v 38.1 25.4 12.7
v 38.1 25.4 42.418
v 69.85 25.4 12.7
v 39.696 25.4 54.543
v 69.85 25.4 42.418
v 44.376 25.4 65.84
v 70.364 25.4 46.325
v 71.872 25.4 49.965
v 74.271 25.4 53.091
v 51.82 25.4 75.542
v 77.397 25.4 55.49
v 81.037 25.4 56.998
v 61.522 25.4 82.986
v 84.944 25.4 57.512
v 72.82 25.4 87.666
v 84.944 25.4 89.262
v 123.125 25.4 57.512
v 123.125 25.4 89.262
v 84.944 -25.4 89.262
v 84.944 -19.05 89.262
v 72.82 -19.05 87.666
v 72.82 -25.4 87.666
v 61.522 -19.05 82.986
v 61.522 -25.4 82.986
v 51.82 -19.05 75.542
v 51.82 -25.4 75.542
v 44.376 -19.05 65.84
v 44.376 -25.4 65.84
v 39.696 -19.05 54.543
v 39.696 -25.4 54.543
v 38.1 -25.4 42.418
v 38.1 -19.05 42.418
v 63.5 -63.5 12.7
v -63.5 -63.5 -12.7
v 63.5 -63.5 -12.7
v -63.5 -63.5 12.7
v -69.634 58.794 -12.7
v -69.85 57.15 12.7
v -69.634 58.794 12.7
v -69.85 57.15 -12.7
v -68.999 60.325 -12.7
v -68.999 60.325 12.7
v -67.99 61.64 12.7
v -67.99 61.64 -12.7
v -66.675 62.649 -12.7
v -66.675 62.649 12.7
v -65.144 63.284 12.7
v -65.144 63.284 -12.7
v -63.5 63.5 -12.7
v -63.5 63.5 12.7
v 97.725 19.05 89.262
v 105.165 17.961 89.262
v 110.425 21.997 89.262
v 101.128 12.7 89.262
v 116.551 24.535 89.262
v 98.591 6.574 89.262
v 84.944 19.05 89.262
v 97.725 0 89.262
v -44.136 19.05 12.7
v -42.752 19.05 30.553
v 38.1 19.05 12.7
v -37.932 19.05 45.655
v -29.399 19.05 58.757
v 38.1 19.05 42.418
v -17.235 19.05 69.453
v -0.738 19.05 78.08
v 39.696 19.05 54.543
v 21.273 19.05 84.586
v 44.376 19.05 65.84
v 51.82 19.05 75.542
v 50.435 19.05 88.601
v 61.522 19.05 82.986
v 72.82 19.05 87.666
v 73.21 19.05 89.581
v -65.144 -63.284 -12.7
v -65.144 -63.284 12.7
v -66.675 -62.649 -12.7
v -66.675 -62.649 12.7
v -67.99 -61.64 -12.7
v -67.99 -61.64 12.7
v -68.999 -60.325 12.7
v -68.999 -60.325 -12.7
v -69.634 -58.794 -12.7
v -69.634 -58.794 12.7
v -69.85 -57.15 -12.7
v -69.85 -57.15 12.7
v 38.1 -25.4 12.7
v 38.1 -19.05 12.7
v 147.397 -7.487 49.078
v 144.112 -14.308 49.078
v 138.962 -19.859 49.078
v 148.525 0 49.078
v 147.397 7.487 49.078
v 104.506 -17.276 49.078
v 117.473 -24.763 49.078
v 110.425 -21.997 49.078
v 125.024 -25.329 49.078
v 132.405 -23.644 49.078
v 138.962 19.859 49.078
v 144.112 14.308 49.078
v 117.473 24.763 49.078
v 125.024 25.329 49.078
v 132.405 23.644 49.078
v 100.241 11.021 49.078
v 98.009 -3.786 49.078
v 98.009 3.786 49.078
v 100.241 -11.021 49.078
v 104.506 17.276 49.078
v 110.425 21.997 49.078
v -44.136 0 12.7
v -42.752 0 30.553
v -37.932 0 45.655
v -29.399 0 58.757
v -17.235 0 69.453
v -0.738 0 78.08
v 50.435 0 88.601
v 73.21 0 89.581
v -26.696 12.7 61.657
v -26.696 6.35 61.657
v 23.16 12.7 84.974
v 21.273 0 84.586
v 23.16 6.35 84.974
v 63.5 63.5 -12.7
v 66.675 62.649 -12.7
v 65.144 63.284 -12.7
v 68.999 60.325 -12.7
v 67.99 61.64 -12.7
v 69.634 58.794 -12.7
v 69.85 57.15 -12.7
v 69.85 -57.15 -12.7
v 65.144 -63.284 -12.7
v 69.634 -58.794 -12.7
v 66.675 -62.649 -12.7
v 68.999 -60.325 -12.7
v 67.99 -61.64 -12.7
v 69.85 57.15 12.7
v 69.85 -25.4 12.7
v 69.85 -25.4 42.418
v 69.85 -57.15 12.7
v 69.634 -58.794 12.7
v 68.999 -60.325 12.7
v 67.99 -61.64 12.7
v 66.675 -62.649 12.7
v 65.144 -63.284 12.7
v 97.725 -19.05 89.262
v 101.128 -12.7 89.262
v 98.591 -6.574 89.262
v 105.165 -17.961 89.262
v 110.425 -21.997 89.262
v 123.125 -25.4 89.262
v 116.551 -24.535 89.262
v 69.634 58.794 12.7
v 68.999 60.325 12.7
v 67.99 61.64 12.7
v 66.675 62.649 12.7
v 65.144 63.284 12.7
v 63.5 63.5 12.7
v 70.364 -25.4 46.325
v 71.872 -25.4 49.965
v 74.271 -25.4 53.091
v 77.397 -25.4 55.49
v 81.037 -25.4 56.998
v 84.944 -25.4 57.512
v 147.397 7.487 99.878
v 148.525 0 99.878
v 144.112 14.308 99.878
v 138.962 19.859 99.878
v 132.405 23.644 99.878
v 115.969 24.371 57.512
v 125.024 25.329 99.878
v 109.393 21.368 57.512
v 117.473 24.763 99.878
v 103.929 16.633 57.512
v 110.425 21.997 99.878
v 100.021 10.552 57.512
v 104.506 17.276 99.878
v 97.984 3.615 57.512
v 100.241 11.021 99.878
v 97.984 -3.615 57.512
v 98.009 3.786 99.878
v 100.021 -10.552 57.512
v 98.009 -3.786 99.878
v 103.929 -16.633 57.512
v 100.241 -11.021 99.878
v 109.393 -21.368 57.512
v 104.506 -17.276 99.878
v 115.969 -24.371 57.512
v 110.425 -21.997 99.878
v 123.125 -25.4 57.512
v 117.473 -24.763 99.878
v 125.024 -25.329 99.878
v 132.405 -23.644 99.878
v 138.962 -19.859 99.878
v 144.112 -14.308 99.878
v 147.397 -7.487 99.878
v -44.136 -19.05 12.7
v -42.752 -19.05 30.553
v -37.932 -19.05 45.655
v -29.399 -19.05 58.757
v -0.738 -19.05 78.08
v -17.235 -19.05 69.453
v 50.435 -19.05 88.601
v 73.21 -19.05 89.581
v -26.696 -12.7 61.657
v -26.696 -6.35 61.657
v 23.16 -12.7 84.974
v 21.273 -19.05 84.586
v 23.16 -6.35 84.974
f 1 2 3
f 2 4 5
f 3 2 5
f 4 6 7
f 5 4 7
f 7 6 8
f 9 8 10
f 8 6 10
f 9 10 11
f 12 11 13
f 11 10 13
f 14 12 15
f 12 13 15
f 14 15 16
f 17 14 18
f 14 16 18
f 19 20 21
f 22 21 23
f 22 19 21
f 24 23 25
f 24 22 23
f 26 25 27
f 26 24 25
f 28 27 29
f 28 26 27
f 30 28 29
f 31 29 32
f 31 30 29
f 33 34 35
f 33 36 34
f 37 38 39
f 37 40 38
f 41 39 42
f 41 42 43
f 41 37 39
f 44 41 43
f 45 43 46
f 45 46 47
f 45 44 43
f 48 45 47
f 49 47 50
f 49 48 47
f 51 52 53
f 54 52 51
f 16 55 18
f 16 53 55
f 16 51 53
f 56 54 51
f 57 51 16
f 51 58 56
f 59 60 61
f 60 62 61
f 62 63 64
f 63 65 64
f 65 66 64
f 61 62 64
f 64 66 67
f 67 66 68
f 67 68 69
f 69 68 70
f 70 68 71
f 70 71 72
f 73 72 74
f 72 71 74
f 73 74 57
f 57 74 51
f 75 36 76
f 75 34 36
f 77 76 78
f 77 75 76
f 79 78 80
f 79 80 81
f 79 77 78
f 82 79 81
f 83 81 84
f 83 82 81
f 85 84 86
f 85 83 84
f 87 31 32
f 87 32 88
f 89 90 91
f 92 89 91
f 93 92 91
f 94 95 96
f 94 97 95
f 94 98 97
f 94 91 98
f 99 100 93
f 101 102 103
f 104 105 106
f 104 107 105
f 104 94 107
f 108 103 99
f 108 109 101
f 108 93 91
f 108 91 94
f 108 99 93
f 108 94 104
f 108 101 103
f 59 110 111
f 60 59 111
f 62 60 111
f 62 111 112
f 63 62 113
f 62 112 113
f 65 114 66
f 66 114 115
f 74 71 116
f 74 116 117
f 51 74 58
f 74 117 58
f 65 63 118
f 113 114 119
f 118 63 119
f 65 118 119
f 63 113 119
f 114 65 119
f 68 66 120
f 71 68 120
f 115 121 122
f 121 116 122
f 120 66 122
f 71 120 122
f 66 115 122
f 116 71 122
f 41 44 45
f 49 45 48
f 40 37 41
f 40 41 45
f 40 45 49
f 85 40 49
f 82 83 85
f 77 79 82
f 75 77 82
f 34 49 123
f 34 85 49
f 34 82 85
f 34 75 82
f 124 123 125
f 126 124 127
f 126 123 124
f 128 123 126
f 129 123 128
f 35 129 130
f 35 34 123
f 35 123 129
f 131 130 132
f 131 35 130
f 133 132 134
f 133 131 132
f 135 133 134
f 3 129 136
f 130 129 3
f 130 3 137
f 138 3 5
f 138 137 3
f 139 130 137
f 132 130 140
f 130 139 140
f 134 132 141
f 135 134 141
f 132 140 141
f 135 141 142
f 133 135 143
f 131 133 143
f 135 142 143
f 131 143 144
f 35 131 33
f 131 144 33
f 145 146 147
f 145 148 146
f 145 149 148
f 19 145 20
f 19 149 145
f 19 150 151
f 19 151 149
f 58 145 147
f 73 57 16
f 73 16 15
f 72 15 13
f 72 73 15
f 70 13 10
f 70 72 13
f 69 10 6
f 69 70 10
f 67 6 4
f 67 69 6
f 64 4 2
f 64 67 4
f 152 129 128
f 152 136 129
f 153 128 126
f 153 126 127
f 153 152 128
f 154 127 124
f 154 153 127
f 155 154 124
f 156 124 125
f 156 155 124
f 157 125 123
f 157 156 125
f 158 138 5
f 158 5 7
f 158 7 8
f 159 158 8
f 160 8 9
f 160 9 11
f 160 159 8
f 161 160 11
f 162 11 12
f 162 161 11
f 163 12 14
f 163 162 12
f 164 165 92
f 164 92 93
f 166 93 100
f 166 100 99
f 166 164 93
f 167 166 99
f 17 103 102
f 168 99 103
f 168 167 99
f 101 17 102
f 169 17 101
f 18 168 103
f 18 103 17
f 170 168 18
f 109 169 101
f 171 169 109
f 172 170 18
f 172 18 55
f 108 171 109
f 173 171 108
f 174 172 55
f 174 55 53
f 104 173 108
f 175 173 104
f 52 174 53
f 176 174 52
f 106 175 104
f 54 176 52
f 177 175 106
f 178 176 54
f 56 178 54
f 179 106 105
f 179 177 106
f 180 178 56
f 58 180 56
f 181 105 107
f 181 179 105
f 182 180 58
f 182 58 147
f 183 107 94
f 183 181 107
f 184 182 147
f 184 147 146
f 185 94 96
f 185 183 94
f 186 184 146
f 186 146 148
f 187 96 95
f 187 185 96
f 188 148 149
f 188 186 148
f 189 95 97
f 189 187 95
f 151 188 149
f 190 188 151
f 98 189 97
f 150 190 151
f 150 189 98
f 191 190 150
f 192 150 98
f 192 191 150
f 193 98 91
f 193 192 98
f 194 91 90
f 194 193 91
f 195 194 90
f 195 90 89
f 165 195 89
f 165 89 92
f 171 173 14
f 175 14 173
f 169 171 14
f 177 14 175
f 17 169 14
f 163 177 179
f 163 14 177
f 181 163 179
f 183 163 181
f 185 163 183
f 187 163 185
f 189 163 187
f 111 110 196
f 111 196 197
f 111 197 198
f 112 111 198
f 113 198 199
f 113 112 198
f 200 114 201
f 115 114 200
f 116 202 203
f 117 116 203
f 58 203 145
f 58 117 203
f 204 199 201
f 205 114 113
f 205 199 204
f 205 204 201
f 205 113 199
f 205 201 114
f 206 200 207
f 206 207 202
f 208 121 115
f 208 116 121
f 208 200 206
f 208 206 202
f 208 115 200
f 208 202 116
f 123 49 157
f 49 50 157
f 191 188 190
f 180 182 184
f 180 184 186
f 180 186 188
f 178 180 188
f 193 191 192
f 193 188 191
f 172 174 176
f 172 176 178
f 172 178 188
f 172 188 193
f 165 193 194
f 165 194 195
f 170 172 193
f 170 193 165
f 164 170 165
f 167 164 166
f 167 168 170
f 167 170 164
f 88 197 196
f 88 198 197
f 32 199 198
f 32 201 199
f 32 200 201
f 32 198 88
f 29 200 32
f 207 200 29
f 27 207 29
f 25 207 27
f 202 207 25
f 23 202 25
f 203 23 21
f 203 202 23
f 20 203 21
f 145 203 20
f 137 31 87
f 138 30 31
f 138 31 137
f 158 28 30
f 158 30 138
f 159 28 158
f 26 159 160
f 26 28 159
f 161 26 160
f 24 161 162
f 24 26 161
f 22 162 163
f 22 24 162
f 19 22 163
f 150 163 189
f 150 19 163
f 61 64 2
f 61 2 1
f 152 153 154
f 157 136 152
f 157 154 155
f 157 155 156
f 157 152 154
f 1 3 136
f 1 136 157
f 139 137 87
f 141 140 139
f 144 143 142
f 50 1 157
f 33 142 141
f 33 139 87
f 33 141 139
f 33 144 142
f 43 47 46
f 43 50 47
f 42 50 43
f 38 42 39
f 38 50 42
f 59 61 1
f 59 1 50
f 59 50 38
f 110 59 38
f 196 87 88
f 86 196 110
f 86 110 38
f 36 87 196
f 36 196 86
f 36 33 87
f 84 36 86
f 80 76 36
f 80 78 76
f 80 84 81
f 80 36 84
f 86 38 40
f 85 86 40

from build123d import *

# Parameters (mm, degrees)
F1_DEPTH = 63.5
F0_W     = 25.4
F0_H     = 31.75
F2_DEPTH = 25.4
F3_DEPTH = 19.05
F5_R     = 6.35


with BuildPart() as f1:
    # F0 (on Front) → F1 (new body, symmetric)
    with BuildSketch(Plane.XZ):
        Polygon((-69.85, -12.7), (69.85, -12.7), (69.85, 12.7), (38.1, 12.7), (-44.13639, 12.7), (-69.85, 12.7), align=None)
    extrude(amount=F1_DEPTH, both=True)

    # F0 (on Front) → F2 (join, symmetric)
    with BuildSketch(Plane.XZ):
        with BuildLine():
            Line((38.1, 12.7), (69.85, 12.7))
            Line((69.85, 12.7), (69.85, 42.418495))
            ThreePointArc((69.85, 42.418495), (74.270896, 53.091481), (84.943882, 57.512377))
            Line((84.943882, 57.512377), (97.725361, 57.512377))
            Line((97.725361, 57.512377), (97.725361, 89.262377))
            Line((97.725361, 89.262377), (84.943882, 89.262377))
            ThreePointArc((84.943882, 89.262377), (51.820255, 75.542121), (38.1, 42.418495))
            Line((38.1, 42.418495), (38.1, 12.7))
        make_face()
        with Locations((110.425361, 73.387377)):
            Rectangle(F0_W, F0_H)
    extrude(amount=F2_DEPTH, both=True)

    # F0 (on Front) → F3 (join, symmetric)
    with BuildSketch(Plane.XZ):
        with BuildLine():
            Line((-44.13639, 12.7), (38.1, 12.7))
            Line((38.1, 12.7), (38.1, 42.418495))
            ThreePointArc((38.1, 42.418495), (51.820255, 75.542121), (84.943882, 89.262377))
            Line((84.943882, 89.262377), (97.725361, 89.262377))
            add(Edge.make_bspline(
                [(-44.13639, 12.7), (-45.473855, 76.681405), (13.374661, 92.285179), (97.725361, 89.262377)],
                knots=[0, 0, 0, 0, 161.203455, 161.203455, 161.203455, 161.203455], degree=3))
        make_face()
    extrude(amount=F3_DEPTH, both=True)

    # F0 (on Front) → F4 (revolve)
    with BuildSketch(Plane.XZ):
        Polygon((123.125361, 99.877948), (123.125361, 89.262377), (123.125361, 57.512377), (123.125361, 49.077948), (148.525361, 49.077948), (148.525361, 99.877948), align=None)
    revolve(axis=Axis((123.125361, 0, 74.477948), (0, 0, 1)))

    # F5
    f5_edges = [f1.edges().sort_by_distance(p)[0] for p in [
        (-69.85, 63.5, 0),
        (69.85, 63.5, 0),
        (-69.85, -63.5, 0),
        (69.85, -63.5, 0),
    ]]
    fillet(f5_edges, radius=F5_R)


solid = f1.part
